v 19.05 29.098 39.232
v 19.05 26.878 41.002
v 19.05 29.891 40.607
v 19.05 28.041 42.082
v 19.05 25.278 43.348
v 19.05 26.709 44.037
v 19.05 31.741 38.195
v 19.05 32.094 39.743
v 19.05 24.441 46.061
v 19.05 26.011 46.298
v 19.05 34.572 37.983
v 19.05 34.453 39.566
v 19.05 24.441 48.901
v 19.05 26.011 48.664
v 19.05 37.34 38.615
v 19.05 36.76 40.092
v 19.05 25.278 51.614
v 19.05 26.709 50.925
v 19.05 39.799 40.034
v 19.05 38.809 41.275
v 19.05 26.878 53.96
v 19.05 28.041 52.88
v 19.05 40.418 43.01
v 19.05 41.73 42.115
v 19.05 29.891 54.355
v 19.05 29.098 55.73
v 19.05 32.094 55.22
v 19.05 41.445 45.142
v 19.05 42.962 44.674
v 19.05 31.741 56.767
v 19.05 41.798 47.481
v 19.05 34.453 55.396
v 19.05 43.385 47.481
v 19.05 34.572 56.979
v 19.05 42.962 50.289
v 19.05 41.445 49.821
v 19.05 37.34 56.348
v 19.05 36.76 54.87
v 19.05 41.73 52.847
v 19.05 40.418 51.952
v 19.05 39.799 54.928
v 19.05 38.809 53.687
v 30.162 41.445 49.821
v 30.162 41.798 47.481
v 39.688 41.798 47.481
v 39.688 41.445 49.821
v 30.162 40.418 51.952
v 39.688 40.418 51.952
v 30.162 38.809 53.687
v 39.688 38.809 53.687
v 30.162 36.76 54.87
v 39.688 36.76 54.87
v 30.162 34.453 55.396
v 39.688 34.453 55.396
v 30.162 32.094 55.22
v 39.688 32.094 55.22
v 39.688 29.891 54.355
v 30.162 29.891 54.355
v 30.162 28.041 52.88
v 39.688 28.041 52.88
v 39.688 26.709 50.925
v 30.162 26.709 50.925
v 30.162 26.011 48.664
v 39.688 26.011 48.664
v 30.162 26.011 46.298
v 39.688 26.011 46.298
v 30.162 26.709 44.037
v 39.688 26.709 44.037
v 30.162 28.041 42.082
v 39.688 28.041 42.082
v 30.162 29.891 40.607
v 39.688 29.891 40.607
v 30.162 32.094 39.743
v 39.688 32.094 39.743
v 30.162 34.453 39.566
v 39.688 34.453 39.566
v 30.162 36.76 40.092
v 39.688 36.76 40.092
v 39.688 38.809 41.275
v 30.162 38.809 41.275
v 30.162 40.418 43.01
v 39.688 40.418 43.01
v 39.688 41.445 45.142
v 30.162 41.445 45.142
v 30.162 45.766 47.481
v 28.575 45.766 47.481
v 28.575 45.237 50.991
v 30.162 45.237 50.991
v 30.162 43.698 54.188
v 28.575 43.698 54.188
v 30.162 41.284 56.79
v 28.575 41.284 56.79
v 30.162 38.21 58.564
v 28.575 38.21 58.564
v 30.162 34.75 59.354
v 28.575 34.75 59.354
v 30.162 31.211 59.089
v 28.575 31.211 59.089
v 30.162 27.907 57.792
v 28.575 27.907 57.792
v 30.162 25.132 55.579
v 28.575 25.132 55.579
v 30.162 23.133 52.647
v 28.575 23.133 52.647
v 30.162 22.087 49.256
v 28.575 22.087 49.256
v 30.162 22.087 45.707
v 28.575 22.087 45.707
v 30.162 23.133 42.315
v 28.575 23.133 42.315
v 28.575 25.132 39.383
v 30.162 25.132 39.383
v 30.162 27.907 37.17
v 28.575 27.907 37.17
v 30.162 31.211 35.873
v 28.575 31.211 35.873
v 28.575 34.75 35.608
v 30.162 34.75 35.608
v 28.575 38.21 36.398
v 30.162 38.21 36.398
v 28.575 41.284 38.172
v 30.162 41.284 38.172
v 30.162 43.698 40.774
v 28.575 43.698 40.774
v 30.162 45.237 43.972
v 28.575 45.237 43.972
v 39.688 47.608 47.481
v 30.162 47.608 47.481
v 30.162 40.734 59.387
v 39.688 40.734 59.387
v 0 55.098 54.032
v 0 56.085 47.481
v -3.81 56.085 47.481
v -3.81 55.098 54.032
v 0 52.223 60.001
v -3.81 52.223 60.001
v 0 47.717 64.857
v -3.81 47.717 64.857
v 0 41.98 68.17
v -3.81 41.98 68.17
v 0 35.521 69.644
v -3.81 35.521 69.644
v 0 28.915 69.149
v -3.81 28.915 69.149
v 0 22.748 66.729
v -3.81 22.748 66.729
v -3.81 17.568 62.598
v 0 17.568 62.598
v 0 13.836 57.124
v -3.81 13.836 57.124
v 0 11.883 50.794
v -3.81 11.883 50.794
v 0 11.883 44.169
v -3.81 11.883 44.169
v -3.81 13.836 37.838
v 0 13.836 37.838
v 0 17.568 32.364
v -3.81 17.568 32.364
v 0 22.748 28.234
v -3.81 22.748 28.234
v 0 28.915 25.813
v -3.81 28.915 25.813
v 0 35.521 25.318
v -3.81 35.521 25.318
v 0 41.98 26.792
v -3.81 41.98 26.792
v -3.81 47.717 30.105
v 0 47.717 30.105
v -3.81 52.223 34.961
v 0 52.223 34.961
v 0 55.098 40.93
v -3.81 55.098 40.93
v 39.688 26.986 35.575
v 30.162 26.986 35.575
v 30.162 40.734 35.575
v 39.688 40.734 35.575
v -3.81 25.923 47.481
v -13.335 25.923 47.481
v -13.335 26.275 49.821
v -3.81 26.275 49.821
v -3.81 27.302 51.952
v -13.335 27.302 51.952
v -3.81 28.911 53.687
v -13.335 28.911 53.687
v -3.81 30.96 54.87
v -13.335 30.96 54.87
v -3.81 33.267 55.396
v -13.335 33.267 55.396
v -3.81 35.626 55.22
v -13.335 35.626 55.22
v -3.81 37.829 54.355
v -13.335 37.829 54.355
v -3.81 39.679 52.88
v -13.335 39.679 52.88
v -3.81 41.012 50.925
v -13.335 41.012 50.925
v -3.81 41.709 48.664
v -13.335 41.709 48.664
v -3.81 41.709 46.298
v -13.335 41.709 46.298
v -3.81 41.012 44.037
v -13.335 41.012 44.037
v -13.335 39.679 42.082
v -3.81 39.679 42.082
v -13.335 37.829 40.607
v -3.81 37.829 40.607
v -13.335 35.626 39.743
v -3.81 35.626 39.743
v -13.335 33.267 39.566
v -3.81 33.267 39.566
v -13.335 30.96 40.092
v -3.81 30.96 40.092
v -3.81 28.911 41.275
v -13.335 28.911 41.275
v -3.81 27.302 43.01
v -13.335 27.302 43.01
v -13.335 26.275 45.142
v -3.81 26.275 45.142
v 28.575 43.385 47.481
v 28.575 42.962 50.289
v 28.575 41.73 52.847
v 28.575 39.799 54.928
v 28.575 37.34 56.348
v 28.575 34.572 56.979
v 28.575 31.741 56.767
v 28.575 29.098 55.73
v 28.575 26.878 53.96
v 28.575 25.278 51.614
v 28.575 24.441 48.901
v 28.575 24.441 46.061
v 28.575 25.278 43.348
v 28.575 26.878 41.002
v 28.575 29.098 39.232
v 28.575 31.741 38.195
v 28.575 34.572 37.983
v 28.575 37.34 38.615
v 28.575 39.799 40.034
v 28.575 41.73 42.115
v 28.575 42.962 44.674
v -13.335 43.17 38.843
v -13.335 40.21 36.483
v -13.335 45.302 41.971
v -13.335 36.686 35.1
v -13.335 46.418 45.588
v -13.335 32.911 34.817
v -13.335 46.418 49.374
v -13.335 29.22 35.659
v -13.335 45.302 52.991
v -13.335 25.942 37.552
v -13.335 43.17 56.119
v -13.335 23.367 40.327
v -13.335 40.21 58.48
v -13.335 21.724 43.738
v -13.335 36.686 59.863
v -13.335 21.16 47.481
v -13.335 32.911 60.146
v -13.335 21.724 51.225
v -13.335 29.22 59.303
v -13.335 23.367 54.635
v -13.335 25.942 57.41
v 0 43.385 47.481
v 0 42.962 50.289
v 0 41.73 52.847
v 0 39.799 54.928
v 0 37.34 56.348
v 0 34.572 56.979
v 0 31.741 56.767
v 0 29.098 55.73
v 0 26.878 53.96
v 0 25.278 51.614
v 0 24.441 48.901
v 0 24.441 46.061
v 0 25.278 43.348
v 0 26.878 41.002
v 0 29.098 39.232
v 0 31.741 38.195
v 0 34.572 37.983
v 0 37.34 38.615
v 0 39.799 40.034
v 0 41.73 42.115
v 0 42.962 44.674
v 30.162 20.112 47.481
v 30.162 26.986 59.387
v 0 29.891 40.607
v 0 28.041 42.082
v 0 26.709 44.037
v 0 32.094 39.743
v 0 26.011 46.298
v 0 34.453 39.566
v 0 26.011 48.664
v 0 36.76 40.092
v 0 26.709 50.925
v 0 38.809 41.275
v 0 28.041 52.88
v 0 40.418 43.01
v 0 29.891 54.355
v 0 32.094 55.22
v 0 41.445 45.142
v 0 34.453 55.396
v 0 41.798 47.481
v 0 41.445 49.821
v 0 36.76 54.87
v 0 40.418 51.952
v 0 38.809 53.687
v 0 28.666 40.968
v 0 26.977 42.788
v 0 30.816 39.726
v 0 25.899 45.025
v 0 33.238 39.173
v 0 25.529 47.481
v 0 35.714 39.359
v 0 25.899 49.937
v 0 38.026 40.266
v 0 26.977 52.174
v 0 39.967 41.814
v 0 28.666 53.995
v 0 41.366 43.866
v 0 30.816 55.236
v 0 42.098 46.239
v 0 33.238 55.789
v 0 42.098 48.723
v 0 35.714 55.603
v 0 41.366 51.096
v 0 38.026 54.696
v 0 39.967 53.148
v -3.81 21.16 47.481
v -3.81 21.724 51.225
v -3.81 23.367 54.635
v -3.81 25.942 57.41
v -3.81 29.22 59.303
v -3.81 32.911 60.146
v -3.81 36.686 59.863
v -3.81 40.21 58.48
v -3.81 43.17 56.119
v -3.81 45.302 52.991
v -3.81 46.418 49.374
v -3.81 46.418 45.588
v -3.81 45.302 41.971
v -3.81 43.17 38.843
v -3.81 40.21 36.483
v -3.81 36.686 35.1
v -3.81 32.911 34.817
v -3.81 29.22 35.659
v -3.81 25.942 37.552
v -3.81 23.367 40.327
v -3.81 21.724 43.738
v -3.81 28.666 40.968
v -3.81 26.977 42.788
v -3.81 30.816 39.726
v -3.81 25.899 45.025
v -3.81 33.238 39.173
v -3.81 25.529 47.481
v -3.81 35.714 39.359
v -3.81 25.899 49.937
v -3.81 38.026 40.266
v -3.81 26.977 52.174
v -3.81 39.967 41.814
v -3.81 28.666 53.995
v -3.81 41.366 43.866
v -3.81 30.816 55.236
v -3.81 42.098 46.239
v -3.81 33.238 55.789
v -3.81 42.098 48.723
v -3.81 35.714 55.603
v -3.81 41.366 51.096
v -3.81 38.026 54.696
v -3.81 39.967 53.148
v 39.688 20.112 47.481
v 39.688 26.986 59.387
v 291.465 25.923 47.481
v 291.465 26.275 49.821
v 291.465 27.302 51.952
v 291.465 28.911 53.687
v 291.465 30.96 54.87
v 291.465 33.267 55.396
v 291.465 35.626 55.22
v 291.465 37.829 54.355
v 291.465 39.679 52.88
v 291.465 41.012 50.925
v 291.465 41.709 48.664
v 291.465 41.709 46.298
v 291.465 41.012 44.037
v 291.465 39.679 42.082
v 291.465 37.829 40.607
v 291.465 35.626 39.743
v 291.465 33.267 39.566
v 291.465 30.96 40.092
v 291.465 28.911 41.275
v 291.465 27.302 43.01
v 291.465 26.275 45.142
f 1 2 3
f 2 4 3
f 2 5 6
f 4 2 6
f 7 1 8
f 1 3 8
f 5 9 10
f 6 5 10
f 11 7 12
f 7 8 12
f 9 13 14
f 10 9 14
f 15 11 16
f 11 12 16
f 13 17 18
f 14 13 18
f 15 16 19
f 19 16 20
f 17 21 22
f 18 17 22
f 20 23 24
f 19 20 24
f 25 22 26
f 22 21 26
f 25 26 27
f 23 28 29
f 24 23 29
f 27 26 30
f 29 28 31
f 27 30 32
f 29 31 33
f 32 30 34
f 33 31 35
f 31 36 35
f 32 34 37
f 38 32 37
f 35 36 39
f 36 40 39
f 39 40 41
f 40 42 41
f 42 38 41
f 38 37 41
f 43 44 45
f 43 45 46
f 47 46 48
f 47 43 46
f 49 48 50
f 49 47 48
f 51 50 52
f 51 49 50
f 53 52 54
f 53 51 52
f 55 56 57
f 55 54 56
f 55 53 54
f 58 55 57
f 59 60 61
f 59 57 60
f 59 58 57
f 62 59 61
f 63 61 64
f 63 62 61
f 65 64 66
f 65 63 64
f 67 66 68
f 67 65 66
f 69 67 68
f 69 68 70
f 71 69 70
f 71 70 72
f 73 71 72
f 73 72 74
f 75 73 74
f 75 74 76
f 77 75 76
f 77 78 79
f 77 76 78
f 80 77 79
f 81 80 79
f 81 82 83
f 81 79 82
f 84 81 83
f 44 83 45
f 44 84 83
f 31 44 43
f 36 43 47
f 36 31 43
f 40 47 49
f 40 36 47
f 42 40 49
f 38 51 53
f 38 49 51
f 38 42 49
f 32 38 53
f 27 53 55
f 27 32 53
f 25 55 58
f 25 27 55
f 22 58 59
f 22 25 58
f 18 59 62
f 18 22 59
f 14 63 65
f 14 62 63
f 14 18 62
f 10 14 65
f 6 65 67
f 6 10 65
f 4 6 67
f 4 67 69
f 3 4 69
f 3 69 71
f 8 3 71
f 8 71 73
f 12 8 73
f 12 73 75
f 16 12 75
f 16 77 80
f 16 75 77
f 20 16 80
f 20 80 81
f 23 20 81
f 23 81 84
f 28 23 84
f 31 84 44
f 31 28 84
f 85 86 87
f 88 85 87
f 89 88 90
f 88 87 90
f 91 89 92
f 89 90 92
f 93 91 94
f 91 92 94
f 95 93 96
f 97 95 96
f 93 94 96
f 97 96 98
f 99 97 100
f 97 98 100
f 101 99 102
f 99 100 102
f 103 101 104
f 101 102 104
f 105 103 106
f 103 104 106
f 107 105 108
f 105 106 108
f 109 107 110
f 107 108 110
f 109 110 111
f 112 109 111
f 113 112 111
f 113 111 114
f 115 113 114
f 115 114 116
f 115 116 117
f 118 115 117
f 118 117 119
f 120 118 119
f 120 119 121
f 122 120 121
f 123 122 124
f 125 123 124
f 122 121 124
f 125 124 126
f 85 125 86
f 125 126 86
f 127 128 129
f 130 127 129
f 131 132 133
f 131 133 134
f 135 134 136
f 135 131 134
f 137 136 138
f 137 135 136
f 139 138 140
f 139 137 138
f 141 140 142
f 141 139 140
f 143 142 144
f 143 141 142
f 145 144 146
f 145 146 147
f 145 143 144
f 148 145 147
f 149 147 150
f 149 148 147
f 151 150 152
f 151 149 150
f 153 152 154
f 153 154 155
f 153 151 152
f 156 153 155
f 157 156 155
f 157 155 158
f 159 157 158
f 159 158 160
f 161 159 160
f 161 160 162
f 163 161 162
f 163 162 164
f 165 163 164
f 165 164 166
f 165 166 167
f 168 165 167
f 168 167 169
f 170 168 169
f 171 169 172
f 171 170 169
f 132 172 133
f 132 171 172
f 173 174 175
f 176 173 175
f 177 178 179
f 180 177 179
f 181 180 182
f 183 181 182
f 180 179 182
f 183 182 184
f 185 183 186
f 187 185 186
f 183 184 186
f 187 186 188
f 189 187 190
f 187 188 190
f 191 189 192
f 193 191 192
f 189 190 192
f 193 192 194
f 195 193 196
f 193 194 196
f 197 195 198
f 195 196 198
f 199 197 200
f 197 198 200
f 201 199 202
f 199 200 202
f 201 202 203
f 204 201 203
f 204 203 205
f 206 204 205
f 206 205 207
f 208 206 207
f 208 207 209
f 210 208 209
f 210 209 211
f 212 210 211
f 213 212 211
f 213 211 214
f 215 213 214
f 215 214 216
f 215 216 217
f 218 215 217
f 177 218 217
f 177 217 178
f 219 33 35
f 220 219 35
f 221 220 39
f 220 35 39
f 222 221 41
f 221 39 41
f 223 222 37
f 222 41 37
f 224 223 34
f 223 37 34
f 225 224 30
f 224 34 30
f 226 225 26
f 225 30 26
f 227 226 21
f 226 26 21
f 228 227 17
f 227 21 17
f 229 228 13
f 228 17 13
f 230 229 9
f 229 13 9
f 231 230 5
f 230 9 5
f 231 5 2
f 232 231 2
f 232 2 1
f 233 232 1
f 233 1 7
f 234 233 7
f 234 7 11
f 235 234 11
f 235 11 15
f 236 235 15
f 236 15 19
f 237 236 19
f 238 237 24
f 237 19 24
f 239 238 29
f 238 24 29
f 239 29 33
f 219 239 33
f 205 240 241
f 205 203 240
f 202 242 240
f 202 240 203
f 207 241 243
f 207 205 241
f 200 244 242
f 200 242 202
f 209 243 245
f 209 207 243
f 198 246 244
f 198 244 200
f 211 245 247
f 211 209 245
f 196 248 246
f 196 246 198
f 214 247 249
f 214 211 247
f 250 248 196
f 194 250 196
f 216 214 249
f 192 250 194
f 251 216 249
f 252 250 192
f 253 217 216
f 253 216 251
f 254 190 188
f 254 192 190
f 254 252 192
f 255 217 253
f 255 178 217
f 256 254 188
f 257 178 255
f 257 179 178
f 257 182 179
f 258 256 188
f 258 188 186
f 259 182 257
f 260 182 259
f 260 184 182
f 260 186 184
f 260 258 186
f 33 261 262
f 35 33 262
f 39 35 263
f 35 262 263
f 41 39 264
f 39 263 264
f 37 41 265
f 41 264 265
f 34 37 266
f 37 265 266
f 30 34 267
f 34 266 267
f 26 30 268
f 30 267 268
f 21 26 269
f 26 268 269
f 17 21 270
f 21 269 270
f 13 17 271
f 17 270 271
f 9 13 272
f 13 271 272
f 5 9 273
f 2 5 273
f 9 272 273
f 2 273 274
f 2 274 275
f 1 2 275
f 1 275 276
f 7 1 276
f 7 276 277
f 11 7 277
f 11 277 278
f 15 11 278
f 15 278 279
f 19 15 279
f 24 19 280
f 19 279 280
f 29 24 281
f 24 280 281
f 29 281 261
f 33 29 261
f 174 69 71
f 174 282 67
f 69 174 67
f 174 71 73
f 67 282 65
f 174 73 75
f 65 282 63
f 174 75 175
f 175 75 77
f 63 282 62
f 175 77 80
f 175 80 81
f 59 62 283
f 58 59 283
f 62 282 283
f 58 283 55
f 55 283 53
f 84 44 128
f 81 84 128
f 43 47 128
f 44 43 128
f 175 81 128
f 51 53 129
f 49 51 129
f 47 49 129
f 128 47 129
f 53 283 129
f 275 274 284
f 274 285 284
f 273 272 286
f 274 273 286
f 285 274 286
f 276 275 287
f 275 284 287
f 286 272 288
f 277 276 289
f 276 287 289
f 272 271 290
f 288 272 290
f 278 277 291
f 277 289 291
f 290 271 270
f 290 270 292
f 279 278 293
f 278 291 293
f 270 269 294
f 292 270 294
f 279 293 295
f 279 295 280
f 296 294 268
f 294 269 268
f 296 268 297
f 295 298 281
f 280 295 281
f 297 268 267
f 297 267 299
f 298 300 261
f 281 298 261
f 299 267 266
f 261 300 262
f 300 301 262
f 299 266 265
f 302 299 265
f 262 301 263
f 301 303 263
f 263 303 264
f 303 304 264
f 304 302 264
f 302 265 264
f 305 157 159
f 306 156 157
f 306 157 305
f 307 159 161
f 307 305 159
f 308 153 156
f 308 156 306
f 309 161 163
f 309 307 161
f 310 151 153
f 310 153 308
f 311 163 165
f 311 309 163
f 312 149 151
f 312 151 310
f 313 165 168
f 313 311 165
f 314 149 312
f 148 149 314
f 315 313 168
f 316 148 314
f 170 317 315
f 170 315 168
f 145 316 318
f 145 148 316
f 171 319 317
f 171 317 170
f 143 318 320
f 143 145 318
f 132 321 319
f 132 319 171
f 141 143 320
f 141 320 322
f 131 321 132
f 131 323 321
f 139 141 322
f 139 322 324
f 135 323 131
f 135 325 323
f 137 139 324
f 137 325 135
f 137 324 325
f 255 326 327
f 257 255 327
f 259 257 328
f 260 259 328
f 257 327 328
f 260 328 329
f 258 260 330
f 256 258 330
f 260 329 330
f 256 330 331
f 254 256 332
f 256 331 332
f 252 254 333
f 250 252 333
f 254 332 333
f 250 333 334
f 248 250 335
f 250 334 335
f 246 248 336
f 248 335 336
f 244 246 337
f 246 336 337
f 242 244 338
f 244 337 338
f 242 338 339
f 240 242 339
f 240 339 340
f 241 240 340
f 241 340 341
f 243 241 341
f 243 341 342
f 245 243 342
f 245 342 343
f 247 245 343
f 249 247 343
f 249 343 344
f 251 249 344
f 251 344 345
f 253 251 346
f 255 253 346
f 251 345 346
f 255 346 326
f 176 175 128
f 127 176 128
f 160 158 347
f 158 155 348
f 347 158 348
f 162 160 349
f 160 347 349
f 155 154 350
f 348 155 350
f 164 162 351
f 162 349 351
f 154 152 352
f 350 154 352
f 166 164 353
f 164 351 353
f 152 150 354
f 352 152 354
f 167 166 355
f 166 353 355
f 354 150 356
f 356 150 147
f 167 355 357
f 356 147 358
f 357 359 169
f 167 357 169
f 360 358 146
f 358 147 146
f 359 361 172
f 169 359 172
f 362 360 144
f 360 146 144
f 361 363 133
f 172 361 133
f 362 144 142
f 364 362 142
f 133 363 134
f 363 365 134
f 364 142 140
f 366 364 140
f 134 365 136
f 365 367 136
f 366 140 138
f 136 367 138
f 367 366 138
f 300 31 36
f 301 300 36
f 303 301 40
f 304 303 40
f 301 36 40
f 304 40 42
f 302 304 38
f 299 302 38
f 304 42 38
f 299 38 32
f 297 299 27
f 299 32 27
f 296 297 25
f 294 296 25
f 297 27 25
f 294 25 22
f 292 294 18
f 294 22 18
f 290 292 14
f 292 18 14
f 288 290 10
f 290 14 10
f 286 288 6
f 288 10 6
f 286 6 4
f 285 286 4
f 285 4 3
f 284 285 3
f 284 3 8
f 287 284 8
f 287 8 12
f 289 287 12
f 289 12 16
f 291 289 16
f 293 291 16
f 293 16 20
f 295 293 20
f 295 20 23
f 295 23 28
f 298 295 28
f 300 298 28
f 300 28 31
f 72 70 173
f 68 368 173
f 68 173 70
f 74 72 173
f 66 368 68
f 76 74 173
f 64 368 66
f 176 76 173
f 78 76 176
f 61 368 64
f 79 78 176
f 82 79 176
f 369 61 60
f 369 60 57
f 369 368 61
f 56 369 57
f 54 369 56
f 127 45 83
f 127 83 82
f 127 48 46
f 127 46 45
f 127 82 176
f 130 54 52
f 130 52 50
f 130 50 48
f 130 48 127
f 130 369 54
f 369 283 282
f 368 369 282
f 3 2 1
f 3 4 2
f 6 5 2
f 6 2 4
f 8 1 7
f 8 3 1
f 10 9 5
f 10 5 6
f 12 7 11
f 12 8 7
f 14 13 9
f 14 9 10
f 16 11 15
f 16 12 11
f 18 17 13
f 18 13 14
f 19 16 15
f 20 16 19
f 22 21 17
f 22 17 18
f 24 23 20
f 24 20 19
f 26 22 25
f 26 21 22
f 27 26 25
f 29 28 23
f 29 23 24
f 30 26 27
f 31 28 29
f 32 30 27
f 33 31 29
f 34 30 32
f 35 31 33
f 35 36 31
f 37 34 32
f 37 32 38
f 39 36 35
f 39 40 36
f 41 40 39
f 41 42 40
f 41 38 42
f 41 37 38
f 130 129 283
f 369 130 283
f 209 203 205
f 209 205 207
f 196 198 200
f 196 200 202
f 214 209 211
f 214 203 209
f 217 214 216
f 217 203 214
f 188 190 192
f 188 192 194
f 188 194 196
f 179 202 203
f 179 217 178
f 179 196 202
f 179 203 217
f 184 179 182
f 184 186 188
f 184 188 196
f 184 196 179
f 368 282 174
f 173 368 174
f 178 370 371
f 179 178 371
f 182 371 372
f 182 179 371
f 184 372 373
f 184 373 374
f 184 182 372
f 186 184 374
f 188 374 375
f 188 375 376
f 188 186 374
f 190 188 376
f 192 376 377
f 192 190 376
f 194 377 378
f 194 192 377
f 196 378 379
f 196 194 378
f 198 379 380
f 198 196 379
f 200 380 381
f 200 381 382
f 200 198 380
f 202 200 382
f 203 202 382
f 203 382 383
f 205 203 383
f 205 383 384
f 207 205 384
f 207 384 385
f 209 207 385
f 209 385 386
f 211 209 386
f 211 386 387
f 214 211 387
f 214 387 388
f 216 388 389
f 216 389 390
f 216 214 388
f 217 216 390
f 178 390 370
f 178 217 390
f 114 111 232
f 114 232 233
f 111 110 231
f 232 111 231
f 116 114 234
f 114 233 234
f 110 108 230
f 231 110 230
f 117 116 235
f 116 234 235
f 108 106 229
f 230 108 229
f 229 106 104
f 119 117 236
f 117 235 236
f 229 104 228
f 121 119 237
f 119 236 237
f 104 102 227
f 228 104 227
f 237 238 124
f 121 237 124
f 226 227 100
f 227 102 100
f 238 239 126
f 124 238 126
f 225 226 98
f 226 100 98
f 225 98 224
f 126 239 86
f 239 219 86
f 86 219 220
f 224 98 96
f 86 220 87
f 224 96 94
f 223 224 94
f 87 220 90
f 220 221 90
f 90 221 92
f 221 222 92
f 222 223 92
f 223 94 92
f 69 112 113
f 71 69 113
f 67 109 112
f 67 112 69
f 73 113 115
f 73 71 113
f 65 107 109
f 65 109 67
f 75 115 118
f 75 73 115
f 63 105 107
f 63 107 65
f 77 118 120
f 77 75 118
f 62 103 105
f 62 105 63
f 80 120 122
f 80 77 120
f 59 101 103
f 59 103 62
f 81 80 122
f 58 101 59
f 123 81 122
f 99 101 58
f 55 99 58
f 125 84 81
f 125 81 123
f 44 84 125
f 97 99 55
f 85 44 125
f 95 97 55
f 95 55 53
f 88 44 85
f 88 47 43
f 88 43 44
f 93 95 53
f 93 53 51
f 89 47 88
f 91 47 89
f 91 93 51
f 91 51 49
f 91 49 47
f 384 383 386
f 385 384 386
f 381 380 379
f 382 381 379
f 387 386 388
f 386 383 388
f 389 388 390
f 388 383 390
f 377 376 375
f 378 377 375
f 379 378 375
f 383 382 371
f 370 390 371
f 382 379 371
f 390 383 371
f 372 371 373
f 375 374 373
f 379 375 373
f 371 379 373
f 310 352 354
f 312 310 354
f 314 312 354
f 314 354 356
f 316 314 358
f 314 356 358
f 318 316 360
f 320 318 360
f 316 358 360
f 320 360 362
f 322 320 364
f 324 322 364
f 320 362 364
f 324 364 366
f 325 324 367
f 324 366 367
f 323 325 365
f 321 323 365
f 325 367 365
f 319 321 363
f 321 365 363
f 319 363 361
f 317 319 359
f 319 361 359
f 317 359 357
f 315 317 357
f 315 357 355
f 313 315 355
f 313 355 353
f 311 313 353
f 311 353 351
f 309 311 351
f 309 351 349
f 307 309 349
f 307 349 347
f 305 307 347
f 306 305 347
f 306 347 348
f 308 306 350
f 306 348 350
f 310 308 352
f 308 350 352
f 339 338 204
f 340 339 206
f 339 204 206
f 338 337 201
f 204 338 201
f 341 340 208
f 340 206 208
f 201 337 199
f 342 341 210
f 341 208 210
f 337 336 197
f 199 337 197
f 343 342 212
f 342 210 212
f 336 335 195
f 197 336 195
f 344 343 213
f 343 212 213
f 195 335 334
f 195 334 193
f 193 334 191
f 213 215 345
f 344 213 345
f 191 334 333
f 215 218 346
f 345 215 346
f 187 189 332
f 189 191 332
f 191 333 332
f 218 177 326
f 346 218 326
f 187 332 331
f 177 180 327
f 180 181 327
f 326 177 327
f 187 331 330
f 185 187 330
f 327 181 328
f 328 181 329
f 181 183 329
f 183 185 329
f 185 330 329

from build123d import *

# Parameters (mm, degrees)
F0_R           = 9.525
F1_DEPTH       = 19.05
F2_R           = 9.525
F3_DEPTH       = 9.525
F5_R           = 11.90625
F6_DEPTH       = 1.5875
F8_DEPTH       = 9.525
F9_R           = 7.9375
F10_DEPTH      = 19.051
F10_DEPTH_BACK = 20.6385
F11_R          = 22.225
F12_DEPTH      = 3.81
F13_R          = 8.3312
F14_DEPTH      = 3.81
F15_R          = 12.7
F16_DEPTH      = 9.525
F17_R          = 7.9375
F18_DEPTH      = 53.0235
F19_R          = 7.9375
F20_DEPTH      = 304.8


with BuildPart() as f1:
    # F0 (on Right) → F1 (new body)
    with BuildSketch(Plane.YZ):
        with Locations((33.8600948453, 47.481123358)):
            Circle(F0_R)
    extrude(amount=F1_DEPTH)


with BuildPart() as f3:
    # F2 (on face) → F3 (new body)
    with BuildSketch(Plane.YZ.offset(19.05)):
        with Locations((33.8600948453, 47.481123358)):
            Circle(F2_R)
    extrude(amount=F3_DEPTH)

    # F5 (on offset) → F6 (join)
    with BuildSketch(Plane.YZ.offset(28.575)):
        with Locations((33.8600948453, 47.481123358)):
            Circle(F5_R)
    extrude(amount=F6_DEPTH)


with BuildPart() as f8:
    # F7 (on face) → F8 (new body)
    with BuildSketch(Plane.YZ.offset(30.1625)):
        Polygon((40.7341714878, 59.387373358), (33.8600948453, 59.387373358), (26.9860182028, 59.387373358), (23.5489798815, 53.434248358), (20.1119415602, 47.481123358), (23.5489798815, 41.527998358), (26.9860182028, 35.574873358), (33.8600948453, 35.574873358), (40.7341714878, 35.574873358), (44.1712098091, 41.527998358), (47.6082481304, 47.481123358), (44.1712098091, 53.434248358), align=None)
    extrude(amount=F8_DEPTH)


with BuildPart() as f10_tool:
    # F9 (on face) → F10 (new body, two sides)
    with BuildSketch(Plane.YZ.offset(19.05)) as f10_sk:
        with Locations((33.8600948453, 47.481123358)):
            Circle(F9_R)
    extrude(amount=-F10_DEPTH)
    extrude(f10_sk.sketch, amount=F10_DEPTH_BACK)


with BuildPart() as f1_1:
    add(f1.part)

    # F10: cut by f10_tool
    add(f10_tool.part, mode=Mode.SUBTRACT)


with BuildPart() as f3_1:
    add(f3.part)

    # F10: cut by f10_tool
    add(f10_tool.part, mode=Mode.SUBTRACT)


with BuildPart() as f8_1:
    add(f8.part)

    # F10: cut by f10_tool
    add(f10_tool.part, mode=Mode.SUBTRACT)


with BuildPart() as f12:
    # F11 (on Right) → F12 (new body)
    with BuildSketch(Plane.YZ):
        with Locations((33.8600948453, 47.481123358)):
            Circle(F11_R)
    extrude(amount=-F12_DEPTH)

    # F13 (on face) → F14 (cut, through all)
    with BuildSketch(Plane(origin=(-3.81, 0, 0), x_dir=(0, -1, 0), z_dir=(-1, 0, 0))):
        with Locations((-33.8600948453, 47.481123358)):
            Circle(F13_R)
    extrude(amount=-F14_DEPTH, mode=Mode.SUBTRACT)


with BuildPart() as f16:
    # F15 (on face) → F16 (new body)
    with BuildSketch(Plane(origin=(-3.81, 0, 0), x_dir=(0, -1, 0), z_dir=(-1, 0, 0))):
        with Locations((-33.8600948453, 47.481123358)):
            Circle(F15_R)
    extrude(amount=F16_DEPTH)

    # F17 (on face) → F18 (cut, through all)
    with BuildSketch(Plane(origin=(-13.335, 0, 0), x_dir=(0, -1, 0), z_dir=(-1, 0, 0))):
        with Locations((-33.8600948453, 47.481123358)):
            Circle(F17_R)
    extrude(amount=-F18_DEPTH, mode=Mode.SUBTRACT)


with BuildPart() as f20:
    # F19 (on face) → F20 (new body)
    with BuildSketch(Plane(origin=(-13.335, 0, 0), x_dir=(0, -1, 0), z_dir=(-1, 0, 0))):
        with Locations((-33.8600948453, 47.481123358)):
            Circle(F19_R)
    extrude(amount=-F20_DEPTH)


solid = Compound([f1_1.part, f3_1.part, f8_1.part, f12.part, f16.part, f20.part])
